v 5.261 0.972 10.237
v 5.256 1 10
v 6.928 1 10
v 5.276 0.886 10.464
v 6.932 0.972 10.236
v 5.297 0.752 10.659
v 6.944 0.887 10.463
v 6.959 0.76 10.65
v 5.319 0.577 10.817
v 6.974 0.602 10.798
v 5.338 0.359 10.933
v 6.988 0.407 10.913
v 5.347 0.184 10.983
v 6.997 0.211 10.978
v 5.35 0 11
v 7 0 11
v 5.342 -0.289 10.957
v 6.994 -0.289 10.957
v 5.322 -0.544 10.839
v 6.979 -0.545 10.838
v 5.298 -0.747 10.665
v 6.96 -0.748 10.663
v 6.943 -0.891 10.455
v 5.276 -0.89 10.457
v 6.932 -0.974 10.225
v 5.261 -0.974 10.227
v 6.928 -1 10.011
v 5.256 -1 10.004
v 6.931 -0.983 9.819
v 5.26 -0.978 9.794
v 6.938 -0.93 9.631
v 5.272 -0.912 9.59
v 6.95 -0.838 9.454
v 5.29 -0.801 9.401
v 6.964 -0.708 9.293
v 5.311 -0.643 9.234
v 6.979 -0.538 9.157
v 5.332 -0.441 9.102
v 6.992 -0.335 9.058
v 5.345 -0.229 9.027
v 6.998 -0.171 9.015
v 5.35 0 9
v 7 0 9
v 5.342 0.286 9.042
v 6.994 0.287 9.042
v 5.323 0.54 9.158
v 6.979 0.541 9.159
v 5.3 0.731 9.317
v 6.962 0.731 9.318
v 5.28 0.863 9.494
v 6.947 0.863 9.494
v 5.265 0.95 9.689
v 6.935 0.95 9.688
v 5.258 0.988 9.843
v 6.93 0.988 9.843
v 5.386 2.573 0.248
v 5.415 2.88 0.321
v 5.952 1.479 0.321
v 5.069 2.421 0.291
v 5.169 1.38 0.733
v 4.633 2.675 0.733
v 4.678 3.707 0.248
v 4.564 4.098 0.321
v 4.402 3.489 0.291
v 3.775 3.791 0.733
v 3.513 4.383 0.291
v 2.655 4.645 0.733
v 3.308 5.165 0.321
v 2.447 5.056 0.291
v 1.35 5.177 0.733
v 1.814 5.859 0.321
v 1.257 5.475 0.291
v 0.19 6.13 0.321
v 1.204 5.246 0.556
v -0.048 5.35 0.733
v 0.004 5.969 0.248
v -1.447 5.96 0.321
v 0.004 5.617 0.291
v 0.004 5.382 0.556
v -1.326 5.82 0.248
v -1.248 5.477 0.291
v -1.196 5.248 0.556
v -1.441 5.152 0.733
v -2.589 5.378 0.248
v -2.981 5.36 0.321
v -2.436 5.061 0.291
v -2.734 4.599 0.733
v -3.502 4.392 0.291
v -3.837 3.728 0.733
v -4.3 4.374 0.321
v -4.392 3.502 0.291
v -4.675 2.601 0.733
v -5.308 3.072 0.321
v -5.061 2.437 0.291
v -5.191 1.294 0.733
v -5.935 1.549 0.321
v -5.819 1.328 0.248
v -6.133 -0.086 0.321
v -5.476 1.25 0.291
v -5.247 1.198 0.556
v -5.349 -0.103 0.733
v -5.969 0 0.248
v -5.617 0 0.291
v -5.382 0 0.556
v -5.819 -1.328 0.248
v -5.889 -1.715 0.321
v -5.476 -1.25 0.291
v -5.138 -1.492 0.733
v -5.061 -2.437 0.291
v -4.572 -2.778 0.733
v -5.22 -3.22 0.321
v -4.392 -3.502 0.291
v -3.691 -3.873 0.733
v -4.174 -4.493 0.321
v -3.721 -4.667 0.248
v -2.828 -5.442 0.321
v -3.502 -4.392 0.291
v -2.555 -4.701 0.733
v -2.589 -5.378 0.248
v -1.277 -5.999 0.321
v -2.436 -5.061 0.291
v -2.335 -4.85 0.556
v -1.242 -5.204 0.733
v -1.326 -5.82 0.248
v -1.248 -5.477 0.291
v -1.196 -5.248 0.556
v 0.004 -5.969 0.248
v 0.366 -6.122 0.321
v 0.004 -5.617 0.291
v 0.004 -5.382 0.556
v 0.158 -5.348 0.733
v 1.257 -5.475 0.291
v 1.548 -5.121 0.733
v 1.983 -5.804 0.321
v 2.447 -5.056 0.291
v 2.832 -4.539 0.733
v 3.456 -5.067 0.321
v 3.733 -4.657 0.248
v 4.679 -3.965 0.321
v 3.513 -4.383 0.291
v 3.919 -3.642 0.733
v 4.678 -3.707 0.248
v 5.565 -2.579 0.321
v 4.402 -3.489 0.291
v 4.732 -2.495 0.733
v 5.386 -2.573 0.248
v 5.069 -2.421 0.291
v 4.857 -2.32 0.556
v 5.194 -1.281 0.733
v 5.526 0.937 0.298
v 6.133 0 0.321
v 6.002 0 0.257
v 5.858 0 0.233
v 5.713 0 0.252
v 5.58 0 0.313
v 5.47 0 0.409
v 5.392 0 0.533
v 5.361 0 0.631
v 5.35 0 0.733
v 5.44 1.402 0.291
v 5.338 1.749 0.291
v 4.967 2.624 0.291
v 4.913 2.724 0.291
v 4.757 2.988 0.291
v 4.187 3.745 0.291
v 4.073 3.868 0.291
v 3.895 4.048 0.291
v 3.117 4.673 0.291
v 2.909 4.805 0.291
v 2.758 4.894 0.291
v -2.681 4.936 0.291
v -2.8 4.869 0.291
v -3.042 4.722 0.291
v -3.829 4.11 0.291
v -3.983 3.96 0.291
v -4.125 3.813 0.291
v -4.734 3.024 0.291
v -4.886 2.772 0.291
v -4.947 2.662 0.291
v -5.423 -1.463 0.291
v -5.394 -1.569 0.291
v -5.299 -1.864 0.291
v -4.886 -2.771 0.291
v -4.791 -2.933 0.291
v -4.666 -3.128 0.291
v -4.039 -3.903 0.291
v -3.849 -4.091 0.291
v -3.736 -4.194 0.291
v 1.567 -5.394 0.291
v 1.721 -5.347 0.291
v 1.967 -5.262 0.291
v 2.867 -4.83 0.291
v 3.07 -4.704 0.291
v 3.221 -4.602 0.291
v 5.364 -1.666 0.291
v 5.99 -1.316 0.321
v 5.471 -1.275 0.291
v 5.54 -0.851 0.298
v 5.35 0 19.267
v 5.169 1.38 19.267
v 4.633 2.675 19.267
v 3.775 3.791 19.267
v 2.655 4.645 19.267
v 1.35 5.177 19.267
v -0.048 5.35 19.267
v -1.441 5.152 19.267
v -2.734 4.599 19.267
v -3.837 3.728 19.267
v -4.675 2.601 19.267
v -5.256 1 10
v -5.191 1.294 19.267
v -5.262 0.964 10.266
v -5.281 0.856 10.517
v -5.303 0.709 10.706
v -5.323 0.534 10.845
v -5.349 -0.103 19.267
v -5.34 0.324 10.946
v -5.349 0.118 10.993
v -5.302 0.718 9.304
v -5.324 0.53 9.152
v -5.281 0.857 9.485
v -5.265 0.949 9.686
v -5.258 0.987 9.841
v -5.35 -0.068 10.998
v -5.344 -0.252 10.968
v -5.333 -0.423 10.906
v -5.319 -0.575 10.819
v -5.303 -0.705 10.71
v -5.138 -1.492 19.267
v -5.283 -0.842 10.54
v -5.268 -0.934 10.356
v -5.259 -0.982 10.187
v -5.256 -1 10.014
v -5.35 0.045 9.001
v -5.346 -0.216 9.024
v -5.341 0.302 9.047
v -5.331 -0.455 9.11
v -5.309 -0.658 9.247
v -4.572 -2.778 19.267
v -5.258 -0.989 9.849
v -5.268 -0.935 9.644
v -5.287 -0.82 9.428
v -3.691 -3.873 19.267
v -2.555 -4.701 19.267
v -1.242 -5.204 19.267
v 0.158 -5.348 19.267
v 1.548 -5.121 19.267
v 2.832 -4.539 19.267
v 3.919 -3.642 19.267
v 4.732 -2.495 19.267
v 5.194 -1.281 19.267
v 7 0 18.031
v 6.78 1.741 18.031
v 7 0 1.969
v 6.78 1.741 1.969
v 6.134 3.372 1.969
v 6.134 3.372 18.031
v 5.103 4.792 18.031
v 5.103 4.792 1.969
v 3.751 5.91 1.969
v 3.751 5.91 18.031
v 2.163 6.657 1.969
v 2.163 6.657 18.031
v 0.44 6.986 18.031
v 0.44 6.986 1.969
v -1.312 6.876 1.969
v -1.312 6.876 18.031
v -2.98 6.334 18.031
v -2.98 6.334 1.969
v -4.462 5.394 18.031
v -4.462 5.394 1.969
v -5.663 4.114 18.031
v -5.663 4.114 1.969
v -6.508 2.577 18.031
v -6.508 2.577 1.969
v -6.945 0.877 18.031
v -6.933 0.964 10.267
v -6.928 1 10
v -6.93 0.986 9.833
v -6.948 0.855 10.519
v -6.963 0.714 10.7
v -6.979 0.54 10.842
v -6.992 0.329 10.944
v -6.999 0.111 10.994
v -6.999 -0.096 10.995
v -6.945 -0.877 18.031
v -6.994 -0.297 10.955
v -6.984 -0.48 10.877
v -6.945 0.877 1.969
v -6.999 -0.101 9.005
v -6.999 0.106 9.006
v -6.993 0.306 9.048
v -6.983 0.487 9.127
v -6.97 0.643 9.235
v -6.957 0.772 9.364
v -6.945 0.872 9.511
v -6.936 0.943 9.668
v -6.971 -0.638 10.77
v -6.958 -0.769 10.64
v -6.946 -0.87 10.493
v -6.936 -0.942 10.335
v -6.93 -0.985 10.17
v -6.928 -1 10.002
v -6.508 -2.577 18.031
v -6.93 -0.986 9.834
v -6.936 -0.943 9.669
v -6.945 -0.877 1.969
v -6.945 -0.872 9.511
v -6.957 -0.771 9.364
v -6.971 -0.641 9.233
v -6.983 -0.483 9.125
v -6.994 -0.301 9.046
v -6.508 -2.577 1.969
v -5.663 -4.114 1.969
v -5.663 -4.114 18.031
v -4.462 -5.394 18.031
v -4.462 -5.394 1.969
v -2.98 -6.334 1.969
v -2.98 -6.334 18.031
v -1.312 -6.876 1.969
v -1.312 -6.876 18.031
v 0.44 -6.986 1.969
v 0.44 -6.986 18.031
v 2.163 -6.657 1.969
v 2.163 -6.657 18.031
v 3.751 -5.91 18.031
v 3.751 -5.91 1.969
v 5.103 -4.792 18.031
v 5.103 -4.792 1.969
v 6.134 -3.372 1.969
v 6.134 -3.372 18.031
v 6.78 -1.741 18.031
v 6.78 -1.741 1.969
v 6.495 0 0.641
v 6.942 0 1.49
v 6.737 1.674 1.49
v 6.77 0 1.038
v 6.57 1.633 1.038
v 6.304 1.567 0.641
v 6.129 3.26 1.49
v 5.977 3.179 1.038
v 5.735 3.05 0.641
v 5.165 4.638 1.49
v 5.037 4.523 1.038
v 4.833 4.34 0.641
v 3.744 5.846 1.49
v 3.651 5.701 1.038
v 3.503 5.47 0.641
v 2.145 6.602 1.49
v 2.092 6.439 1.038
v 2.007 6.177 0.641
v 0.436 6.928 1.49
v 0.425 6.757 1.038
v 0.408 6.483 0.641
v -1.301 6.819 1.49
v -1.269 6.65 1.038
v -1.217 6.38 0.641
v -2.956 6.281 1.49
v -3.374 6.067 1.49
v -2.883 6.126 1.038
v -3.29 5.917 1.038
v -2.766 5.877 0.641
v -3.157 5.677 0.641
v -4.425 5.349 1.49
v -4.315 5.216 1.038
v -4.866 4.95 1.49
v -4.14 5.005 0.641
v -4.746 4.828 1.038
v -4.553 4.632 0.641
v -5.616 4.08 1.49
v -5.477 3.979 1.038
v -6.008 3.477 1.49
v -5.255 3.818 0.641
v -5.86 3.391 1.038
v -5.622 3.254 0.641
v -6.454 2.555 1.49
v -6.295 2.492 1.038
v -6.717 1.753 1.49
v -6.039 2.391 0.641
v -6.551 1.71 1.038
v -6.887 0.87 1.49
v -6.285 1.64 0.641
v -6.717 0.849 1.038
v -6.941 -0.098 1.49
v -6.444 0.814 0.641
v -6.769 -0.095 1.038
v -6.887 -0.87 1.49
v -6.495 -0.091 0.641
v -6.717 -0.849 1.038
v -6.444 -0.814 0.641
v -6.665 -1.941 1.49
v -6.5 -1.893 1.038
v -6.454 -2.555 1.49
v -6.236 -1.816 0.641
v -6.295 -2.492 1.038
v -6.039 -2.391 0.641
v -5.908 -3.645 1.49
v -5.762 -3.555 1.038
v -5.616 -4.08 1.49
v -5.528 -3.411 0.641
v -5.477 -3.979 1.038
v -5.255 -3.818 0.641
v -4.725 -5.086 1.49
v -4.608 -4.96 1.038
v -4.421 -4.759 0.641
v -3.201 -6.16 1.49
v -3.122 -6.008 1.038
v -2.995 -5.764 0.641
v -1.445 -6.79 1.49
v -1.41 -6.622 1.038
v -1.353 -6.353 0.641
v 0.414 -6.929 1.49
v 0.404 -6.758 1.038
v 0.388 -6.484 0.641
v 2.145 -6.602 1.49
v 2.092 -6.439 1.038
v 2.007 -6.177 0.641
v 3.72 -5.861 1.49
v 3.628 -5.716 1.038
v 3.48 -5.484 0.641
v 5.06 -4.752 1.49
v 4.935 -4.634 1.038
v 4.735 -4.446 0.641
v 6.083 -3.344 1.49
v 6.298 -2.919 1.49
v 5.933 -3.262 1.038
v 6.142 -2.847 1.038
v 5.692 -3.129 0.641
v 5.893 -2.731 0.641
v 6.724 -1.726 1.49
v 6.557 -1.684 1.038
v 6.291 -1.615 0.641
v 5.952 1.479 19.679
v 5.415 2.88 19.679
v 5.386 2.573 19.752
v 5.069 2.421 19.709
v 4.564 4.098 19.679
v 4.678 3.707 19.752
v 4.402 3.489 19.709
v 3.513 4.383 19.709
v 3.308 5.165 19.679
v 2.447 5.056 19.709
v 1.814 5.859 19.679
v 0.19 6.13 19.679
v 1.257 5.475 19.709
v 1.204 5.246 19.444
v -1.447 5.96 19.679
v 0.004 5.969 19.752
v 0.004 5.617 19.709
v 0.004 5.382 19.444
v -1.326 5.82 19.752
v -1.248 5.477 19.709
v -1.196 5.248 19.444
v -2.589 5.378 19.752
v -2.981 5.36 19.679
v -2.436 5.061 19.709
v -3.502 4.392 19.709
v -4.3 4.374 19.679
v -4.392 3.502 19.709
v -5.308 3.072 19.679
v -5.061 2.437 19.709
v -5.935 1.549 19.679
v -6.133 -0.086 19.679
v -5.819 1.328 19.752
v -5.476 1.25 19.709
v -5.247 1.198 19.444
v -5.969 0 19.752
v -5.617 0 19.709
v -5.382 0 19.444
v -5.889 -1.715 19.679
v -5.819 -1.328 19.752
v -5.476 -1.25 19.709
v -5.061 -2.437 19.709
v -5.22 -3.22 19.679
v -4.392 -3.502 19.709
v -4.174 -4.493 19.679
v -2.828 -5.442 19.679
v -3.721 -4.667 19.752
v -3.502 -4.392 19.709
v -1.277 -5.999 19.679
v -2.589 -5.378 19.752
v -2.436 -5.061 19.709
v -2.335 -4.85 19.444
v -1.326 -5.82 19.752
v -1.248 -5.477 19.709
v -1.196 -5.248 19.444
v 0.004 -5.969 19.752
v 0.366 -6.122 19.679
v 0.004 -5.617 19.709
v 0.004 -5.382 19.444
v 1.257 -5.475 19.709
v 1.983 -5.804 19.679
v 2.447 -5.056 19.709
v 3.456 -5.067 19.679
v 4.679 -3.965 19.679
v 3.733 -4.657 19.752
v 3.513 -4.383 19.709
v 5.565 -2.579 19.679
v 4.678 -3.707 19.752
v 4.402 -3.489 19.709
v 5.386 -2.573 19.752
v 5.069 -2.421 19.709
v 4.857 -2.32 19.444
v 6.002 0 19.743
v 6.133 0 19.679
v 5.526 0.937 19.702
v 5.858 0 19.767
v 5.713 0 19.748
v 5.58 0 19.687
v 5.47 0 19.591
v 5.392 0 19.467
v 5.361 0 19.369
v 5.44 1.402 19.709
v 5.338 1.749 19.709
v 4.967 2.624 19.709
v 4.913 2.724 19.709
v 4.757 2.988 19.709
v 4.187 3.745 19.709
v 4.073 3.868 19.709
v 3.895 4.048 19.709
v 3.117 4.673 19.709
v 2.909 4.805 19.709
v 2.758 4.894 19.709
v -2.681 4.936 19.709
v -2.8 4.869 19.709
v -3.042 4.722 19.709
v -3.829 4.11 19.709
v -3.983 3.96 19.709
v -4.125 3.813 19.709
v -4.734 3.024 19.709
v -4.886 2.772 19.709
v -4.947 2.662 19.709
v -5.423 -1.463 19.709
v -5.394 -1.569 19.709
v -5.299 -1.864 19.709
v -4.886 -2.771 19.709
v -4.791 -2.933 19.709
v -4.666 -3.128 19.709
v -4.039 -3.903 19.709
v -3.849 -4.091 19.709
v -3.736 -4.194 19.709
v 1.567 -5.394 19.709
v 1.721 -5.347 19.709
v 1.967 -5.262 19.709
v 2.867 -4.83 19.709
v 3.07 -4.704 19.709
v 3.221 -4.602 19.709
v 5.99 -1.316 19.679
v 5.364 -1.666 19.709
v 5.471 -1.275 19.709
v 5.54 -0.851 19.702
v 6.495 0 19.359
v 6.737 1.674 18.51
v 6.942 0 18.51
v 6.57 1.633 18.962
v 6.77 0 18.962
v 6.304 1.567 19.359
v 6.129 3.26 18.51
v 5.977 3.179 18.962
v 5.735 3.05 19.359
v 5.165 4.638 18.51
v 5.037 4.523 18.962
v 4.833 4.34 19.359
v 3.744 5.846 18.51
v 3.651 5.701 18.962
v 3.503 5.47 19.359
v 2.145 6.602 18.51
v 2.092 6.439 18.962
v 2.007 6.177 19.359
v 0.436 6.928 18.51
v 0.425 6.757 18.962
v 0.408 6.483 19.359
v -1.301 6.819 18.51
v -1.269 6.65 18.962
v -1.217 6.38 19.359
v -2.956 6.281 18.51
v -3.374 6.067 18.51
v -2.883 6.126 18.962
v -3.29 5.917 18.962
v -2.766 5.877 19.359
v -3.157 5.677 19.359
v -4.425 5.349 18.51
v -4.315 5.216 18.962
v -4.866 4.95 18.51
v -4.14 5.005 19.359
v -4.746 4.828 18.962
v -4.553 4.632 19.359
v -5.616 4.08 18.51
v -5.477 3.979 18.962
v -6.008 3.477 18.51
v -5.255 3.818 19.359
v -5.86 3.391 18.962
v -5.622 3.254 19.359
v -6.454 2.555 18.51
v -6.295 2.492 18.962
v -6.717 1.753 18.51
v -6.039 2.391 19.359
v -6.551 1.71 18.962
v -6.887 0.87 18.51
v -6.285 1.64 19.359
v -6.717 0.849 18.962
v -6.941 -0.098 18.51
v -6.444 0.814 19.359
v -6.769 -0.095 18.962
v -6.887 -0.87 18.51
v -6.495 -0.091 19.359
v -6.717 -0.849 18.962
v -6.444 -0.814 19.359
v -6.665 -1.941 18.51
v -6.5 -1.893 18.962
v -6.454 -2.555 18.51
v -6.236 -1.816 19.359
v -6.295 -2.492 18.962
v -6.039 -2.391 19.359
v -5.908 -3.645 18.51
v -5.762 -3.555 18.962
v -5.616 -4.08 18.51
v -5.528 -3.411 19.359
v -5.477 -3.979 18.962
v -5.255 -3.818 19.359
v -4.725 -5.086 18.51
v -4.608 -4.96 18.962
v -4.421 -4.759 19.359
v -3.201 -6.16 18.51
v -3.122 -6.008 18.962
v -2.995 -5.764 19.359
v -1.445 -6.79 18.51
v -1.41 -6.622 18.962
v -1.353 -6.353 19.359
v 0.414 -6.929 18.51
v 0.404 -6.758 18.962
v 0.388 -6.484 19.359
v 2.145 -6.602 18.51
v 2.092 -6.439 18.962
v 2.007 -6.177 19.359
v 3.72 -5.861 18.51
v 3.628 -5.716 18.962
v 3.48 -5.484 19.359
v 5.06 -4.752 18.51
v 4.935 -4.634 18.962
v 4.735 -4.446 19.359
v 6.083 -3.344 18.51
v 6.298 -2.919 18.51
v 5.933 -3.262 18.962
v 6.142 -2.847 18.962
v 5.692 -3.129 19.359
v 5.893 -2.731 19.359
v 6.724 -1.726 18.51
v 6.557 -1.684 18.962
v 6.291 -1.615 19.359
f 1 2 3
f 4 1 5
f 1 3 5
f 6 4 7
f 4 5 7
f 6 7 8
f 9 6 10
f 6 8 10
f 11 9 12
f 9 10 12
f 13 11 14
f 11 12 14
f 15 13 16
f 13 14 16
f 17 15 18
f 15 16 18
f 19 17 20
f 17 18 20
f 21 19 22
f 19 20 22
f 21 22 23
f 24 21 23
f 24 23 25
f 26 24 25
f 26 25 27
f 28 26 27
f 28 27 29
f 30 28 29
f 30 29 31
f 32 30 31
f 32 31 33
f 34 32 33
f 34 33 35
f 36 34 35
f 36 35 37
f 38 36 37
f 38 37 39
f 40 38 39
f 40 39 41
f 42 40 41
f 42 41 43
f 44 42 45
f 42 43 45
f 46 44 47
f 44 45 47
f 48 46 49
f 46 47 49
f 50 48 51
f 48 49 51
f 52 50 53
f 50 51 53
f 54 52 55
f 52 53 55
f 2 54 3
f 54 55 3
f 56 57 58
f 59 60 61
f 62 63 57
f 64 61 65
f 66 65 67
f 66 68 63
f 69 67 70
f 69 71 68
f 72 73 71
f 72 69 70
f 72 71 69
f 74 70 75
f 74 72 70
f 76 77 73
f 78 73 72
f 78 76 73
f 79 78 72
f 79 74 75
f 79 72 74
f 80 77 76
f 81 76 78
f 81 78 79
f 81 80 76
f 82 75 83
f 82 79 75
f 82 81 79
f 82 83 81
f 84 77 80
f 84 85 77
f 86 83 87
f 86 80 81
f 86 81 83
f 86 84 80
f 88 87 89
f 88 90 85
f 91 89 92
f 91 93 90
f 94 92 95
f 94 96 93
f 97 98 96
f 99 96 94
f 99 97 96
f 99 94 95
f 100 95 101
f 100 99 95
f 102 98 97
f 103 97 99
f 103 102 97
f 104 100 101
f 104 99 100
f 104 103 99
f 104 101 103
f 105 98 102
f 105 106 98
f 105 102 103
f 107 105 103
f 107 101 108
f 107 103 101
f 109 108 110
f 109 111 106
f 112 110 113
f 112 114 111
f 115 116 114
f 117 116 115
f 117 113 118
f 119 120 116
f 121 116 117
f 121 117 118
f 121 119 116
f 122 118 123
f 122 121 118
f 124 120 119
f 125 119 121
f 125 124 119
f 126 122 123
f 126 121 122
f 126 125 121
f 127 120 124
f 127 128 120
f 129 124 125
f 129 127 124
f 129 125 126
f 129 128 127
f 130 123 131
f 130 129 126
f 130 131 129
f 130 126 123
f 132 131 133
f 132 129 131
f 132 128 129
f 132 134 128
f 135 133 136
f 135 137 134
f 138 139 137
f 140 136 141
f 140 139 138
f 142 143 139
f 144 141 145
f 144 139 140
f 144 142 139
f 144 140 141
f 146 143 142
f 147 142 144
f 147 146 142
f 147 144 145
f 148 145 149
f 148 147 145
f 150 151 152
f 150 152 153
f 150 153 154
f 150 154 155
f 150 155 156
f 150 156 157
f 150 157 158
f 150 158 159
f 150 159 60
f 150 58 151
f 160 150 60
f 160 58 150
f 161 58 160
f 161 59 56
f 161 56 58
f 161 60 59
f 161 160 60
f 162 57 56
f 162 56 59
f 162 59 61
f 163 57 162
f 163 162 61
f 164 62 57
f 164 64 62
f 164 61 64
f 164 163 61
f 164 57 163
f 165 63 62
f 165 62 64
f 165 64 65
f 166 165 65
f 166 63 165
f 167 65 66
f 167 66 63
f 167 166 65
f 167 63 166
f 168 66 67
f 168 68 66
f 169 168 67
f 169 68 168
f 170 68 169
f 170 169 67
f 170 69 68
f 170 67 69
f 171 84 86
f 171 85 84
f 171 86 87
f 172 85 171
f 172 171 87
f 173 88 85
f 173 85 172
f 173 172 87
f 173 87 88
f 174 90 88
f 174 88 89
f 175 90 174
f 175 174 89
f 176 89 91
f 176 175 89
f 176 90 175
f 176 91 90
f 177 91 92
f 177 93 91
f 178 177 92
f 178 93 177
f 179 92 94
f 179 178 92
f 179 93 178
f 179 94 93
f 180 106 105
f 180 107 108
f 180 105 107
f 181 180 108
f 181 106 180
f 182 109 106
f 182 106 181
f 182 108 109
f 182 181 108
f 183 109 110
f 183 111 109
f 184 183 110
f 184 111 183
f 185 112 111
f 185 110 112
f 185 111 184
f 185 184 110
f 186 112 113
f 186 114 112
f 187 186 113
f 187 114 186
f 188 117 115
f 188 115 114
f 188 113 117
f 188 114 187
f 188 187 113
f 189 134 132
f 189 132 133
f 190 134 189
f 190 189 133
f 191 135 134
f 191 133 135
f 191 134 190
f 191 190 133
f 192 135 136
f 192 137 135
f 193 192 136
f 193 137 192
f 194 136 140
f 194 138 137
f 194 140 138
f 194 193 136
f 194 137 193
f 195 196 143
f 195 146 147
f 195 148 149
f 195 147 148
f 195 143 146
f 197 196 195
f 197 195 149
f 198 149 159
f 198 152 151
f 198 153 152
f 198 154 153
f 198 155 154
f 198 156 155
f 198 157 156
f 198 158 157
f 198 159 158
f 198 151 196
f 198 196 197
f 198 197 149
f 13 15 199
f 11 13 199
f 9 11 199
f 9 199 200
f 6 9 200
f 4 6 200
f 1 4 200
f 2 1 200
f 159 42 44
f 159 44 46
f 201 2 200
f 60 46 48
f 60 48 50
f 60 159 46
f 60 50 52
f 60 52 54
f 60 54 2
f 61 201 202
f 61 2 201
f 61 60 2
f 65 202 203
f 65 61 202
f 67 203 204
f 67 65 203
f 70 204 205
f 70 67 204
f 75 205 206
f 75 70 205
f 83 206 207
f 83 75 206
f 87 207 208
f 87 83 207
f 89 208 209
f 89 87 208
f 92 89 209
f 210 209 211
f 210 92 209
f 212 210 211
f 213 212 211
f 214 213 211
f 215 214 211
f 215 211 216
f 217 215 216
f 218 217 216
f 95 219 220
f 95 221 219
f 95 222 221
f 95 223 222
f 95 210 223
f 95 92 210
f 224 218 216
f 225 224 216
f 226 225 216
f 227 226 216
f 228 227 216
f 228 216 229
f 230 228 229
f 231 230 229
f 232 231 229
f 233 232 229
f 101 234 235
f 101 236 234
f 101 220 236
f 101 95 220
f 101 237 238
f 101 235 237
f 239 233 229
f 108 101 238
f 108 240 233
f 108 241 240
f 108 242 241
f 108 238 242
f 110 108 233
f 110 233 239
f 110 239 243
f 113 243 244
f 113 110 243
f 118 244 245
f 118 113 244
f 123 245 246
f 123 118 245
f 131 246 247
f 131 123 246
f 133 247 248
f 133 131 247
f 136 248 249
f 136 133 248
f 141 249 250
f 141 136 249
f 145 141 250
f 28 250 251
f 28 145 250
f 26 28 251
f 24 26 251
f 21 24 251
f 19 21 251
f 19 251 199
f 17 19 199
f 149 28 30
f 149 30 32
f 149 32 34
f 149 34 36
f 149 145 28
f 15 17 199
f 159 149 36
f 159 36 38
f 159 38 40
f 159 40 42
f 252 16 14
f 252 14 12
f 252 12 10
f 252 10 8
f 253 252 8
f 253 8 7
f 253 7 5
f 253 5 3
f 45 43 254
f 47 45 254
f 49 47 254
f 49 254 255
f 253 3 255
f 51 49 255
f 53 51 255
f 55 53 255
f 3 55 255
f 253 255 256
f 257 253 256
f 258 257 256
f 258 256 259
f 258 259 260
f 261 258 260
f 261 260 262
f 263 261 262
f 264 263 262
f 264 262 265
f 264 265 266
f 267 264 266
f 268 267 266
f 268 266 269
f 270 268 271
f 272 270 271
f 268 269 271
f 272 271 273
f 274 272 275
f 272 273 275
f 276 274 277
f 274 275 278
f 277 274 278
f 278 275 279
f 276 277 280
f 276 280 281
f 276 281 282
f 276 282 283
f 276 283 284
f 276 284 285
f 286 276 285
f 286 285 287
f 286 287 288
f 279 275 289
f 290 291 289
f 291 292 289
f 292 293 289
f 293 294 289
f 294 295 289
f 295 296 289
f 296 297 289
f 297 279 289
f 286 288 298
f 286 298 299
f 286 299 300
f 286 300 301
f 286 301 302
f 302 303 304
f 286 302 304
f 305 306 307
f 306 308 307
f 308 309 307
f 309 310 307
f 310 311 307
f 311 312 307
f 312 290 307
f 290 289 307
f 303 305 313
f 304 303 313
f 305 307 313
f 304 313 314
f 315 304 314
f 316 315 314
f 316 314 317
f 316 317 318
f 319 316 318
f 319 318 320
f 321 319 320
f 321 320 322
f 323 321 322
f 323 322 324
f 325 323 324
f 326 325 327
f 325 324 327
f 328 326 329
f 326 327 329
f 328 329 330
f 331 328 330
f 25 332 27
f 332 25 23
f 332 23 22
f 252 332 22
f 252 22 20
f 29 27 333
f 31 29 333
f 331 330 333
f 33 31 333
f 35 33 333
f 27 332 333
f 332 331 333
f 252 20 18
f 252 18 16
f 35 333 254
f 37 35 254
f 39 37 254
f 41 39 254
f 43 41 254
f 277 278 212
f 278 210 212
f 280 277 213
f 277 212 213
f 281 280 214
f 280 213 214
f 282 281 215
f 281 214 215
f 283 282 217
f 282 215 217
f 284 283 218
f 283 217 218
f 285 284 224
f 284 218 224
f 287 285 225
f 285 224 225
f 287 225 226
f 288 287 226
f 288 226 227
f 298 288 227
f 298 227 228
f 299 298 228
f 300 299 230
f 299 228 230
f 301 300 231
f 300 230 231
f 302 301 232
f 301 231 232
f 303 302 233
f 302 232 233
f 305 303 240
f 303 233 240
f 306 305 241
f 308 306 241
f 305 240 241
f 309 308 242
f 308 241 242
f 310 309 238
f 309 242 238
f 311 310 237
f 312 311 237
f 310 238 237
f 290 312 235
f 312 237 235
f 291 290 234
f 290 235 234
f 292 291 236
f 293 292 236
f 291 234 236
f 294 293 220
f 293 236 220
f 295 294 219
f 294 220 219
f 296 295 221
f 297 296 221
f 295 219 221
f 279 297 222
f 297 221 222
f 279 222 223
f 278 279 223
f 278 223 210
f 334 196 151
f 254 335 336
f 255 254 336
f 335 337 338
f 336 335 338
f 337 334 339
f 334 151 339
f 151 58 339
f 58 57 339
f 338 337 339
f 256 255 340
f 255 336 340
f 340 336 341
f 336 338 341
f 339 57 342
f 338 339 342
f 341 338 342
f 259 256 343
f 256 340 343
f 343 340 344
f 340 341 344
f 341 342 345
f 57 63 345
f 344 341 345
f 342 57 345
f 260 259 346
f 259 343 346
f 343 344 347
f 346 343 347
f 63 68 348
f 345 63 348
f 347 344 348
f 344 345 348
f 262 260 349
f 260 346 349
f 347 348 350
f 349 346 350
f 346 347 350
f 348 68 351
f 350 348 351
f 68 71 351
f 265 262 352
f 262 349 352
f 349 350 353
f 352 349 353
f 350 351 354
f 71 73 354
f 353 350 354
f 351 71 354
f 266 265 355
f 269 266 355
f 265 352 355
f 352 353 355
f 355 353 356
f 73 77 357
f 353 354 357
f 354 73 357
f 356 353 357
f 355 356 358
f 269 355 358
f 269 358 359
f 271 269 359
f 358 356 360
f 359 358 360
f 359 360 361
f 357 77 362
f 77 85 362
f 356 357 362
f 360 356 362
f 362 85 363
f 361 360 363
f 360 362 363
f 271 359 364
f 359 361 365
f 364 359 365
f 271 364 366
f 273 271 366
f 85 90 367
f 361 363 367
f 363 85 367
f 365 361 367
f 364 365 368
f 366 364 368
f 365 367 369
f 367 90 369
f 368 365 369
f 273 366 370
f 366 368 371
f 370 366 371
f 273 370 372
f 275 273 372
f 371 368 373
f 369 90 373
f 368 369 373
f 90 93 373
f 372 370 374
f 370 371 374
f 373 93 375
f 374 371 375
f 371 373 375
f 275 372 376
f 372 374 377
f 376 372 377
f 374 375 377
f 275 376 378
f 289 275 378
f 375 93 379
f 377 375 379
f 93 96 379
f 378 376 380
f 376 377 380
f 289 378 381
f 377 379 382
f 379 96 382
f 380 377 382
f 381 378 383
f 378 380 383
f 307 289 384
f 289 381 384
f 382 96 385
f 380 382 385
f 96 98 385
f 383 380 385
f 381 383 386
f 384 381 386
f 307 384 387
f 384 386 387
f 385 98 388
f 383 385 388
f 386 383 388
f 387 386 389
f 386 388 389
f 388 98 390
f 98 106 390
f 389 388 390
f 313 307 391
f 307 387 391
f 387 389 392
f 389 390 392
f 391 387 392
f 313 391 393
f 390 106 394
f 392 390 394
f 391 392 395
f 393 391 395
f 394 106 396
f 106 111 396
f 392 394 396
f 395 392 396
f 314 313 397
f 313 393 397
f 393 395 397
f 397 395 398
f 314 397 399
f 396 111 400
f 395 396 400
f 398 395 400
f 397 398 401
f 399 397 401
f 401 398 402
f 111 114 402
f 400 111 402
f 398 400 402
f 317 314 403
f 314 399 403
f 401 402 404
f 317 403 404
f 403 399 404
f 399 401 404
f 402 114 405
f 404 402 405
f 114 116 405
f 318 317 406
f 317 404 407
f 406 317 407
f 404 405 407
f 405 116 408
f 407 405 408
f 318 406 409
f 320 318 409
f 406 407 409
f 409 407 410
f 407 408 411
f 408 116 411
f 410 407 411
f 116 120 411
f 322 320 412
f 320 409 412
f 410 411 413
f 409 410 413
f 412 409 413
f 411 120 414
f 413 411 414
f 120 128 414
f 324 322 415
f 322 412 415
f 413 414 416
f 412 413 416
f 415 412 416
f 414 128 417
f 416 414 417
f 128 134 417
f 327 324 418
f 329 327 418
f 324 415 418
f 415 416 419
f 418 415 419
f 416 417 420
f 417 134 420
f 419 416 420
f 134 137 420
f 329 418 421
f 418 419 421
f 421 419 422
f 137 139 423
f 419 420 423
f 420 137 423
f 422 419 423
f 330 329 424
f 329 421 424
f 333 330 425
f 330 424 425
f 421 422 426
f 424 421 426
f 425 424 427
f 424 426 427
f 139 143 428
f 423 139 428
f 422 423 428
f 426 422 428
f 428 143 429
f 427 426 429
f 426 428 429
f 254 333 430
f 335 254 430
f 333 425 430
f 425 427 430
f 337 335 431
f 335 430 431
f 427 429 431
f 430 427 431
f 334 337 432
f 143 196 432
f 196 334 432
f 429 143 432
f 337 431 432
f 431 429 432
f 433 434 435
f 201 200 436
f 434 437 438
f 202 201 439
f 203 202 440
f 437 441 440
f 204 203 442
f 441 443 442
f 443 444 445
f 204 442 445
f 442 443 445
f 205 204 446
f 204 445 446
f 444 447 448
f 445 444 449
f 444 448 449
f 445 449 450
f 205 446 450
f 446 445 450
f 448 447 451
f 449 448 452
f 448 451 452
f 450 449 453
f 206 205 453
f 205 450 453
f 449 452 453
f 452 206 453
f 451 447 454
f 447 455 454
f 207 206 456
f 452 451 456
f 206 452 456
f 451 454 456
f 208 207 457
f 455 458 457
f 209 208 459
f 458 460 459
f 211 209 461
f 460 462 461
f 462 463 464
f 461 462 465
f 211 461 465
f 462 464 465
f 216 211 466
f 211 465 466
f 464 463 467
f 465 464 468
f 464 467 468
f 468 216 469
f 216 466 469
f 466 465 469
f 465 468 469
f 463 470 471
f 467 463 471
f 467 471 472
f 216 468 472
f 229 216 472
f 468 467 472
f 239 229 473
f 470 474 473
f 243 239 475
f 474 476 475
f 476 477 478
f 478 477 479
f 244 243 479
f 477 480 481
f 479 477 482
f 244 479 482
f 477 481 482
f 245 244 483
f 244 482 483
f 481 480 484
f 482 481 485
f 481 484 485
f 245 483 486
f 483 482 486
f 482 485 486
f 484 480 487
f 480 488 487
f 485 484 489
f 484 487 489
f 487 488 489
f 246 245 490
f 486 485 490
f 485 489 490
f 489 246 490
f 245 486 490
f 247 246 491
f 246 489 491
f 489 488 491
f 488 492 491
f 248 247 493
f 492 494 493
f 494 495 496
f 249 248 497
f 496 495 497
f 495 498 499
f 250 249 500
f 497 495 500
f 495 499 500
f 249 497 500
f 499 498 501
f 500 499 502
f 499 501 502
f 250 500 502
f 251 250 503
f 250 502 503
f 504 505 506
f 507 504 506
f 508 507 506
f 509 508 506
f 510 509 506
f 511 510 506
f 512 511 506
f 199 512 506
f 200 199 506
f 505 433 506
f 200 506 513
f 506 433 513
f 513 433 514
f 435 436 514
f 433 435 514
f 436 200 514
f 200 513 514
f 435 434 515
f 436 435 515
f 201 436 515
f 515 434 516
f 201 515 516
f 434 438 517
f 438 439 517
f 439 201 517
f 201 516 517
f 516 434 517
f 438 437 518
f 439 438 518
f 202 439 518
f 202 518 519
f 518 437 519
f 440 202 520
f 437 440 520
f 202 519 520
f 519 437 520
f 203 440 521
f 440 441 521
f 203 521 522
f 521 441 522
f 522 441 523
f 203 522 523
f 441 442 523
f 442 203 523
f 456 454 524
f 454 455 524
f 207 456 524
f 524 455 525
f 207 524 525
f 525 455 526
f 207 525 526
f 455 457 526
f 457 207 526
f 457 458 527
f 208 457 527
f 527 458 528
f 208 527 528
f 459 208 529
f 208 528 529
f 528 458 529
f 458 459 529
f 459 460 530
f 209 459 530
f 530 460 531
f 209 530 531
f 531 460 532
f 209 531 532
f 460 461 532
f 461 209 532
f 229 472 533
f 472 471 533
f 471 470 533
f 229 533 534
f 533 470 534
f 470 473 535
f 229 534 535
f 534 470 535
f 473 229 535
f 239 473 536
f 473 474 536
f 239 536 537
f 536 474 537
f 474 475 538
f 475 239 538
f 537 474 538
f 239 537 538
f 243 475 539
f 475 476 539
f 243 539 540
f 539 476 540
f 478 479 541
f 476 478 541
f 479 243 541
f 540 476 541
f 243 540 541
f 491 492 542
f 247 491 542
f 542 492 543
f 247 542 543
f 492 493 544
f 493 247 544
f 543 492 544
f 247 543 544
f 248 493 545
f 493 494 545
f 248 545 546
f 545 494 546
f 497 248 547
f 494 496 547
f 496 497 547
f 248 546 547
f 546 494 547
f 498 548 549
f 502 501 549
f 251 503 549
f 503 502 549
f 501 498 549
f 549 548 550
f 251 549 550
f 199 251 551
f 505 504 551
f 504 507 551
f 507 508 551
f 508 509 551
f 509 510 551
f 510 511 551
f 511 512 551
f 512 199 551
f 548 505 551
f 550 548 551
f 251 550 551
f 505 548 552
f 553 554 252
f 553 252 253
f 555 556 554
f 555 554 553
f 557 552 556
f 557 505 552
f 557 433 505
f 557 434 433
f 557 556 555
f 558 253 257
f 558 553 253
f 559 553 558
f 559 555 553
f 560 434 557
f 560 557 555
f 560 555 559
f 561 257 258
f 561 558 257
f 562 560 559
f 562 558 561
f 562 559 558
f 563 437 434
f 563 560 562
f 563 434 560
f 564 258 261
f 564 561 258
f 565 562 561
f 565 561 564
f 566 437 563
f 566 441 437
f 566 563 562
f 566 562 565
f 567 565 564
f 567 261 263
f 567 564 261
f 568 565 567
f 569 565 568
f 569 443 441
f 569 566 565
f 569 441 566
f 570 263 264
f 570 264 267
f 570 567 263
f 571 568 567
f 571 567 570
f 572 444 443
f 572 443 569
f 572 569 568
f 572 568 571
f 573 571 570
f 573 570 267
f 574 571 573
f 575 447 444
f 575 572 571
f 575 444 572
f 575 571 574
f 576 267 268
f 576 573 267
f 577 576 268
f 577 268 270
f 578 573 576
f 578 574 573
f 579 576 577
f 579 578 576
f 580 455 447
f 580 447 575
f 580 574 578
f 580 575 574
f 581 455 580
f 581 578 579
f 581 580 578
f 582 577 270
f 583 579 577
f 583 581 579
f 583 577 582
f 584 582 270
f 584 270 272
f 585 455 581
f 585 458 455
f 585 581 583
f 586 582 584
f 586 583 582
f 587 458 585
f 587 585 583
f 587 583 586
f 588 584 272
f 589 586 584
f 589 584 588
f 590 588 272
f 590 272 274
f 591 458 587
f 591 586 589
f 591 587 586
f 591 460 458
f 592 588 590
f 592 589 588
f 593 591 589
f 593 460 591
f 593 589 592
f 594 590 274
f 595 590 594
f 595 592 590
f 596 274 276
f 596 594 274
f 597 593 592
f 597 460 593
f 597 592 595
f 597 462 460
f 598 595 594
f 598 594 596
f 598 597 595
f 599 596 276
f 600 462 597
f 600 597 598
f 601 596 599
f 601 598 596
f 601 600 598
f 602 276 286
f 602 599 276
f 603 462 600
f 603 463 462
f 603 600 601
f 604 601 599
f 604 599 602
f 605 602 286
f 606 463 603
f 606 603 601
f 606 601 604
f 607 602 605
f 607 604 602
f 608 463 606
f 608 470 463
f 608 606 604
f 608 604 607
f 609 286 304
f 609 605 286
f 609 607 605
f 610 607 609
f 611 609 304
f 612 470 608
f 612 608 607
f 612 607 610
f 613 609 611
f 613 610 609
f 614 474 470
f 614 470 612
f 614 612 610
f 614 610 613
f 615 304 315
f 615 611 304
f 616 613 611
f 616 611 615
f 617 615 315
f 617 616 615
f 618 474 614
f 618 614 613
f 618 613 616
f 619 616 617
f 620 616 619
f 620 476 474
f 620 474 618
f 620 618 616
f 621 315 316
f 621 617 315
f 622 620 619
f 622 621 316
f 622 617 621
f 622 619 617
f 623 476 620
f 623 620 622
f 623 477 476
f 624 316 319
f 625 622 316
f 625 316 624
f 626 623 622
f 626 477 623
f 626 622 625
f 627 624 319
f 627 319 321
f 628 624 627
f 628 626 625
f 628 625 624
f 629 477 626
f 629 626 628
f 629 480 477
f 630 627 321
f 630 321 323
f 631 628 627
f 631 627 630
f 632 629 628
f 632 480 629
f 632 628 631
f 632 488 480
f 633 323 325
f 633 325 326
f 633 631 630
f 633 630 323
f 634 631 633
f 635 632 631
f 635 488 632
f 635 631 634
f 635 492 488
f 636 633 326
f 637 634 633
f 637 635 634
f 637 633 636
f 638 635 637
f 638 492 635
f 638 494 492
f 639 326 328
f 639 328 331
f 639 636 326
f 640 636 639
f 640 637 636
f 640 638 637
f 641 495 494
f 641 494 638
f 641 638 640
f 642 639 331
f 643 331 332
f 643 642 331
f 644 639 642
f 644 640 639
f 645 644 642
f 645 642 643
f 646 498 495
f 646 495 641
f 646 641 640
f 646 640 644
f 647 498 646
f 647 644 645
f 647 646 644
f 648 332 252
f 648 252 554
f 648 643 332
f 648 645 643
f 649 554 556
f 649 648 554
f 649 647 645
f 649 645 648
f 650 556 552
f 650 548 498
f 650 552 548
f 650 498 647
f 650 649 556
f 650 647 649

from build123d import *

# Parameters (mm, degrees)
F0_R     = 7
F0_R_2   = 5.35
F1_DEPTH = 20
F2_R     = 1
F3_DEPTH = 12.5
F5_R     = 0.5


# Not quite as in the source:
# - a fillet or chamfer that OpenCascade refuses, or shapes differently, is made with other operations: its cross-section is extruded or revolved along the edge and cut away or added


with BuildPart() as f1:
    # F0 (on Top) → F1 (new body)
    with BuildSketch(Plane.XY):
        Circle(F0_R)
        Circle(F0_R_2, mode=Mode.SUBTRACT)
    extrude(amount=F1_DEPTH)

    # F2 (on Right) → F3 (cut, symmetric)
    with BuildSketch(Plane.YZ):
        with Locations((0, 10)):
            Circle(F2_R)
    extrude(amount=F3_DEPTH, both=True, mode=Mode.SUBTRACT)

    # F4: fillet of radius 2 on 2 edges, made by hand

    # F4_s1 → F4_t2 (revolve, cut)
    with BuildSketch(Plane.XZ):
        with BuildLine():
            ThreePointArc((7, 18.0308631332), (6.5329709717, 19.3153863911), (5.35, 20))
            Line((5.35, 20), (7, 20))
            Line((7, 20), (7, 18.0308631332))
        make_face()
    revolve(axis=Axis((0, 0, 20), (0, 0, 1)), mode=Mode.SUBTRACT)

    # F4_s3 → F4_t4 (revolve, cut)
    with BuildSketch(Plane.XZ):
        with BuildLine():
            ThreePointArc((7, 1.9691368668), (6.5329709717, 0.6846136089), (5.35, 0))
            Line((5.35, 0), (7, 0))
            Line((7, 0), (7, 1.9691368668))
        make_face()
    revolve(axis=Axis((0, 0, 0), (0, 0, 1)), mode=Mode.SUBTRACT)

    # F5
    f5_edges = [f1.edges().sort_by_distance(p)[0] for p in [
        (-5.35, 0, 20),
        (-5.35, 0, 0),
    ]]
    fillet(f5_edges, radius=F5_R)


solid = f1.part
